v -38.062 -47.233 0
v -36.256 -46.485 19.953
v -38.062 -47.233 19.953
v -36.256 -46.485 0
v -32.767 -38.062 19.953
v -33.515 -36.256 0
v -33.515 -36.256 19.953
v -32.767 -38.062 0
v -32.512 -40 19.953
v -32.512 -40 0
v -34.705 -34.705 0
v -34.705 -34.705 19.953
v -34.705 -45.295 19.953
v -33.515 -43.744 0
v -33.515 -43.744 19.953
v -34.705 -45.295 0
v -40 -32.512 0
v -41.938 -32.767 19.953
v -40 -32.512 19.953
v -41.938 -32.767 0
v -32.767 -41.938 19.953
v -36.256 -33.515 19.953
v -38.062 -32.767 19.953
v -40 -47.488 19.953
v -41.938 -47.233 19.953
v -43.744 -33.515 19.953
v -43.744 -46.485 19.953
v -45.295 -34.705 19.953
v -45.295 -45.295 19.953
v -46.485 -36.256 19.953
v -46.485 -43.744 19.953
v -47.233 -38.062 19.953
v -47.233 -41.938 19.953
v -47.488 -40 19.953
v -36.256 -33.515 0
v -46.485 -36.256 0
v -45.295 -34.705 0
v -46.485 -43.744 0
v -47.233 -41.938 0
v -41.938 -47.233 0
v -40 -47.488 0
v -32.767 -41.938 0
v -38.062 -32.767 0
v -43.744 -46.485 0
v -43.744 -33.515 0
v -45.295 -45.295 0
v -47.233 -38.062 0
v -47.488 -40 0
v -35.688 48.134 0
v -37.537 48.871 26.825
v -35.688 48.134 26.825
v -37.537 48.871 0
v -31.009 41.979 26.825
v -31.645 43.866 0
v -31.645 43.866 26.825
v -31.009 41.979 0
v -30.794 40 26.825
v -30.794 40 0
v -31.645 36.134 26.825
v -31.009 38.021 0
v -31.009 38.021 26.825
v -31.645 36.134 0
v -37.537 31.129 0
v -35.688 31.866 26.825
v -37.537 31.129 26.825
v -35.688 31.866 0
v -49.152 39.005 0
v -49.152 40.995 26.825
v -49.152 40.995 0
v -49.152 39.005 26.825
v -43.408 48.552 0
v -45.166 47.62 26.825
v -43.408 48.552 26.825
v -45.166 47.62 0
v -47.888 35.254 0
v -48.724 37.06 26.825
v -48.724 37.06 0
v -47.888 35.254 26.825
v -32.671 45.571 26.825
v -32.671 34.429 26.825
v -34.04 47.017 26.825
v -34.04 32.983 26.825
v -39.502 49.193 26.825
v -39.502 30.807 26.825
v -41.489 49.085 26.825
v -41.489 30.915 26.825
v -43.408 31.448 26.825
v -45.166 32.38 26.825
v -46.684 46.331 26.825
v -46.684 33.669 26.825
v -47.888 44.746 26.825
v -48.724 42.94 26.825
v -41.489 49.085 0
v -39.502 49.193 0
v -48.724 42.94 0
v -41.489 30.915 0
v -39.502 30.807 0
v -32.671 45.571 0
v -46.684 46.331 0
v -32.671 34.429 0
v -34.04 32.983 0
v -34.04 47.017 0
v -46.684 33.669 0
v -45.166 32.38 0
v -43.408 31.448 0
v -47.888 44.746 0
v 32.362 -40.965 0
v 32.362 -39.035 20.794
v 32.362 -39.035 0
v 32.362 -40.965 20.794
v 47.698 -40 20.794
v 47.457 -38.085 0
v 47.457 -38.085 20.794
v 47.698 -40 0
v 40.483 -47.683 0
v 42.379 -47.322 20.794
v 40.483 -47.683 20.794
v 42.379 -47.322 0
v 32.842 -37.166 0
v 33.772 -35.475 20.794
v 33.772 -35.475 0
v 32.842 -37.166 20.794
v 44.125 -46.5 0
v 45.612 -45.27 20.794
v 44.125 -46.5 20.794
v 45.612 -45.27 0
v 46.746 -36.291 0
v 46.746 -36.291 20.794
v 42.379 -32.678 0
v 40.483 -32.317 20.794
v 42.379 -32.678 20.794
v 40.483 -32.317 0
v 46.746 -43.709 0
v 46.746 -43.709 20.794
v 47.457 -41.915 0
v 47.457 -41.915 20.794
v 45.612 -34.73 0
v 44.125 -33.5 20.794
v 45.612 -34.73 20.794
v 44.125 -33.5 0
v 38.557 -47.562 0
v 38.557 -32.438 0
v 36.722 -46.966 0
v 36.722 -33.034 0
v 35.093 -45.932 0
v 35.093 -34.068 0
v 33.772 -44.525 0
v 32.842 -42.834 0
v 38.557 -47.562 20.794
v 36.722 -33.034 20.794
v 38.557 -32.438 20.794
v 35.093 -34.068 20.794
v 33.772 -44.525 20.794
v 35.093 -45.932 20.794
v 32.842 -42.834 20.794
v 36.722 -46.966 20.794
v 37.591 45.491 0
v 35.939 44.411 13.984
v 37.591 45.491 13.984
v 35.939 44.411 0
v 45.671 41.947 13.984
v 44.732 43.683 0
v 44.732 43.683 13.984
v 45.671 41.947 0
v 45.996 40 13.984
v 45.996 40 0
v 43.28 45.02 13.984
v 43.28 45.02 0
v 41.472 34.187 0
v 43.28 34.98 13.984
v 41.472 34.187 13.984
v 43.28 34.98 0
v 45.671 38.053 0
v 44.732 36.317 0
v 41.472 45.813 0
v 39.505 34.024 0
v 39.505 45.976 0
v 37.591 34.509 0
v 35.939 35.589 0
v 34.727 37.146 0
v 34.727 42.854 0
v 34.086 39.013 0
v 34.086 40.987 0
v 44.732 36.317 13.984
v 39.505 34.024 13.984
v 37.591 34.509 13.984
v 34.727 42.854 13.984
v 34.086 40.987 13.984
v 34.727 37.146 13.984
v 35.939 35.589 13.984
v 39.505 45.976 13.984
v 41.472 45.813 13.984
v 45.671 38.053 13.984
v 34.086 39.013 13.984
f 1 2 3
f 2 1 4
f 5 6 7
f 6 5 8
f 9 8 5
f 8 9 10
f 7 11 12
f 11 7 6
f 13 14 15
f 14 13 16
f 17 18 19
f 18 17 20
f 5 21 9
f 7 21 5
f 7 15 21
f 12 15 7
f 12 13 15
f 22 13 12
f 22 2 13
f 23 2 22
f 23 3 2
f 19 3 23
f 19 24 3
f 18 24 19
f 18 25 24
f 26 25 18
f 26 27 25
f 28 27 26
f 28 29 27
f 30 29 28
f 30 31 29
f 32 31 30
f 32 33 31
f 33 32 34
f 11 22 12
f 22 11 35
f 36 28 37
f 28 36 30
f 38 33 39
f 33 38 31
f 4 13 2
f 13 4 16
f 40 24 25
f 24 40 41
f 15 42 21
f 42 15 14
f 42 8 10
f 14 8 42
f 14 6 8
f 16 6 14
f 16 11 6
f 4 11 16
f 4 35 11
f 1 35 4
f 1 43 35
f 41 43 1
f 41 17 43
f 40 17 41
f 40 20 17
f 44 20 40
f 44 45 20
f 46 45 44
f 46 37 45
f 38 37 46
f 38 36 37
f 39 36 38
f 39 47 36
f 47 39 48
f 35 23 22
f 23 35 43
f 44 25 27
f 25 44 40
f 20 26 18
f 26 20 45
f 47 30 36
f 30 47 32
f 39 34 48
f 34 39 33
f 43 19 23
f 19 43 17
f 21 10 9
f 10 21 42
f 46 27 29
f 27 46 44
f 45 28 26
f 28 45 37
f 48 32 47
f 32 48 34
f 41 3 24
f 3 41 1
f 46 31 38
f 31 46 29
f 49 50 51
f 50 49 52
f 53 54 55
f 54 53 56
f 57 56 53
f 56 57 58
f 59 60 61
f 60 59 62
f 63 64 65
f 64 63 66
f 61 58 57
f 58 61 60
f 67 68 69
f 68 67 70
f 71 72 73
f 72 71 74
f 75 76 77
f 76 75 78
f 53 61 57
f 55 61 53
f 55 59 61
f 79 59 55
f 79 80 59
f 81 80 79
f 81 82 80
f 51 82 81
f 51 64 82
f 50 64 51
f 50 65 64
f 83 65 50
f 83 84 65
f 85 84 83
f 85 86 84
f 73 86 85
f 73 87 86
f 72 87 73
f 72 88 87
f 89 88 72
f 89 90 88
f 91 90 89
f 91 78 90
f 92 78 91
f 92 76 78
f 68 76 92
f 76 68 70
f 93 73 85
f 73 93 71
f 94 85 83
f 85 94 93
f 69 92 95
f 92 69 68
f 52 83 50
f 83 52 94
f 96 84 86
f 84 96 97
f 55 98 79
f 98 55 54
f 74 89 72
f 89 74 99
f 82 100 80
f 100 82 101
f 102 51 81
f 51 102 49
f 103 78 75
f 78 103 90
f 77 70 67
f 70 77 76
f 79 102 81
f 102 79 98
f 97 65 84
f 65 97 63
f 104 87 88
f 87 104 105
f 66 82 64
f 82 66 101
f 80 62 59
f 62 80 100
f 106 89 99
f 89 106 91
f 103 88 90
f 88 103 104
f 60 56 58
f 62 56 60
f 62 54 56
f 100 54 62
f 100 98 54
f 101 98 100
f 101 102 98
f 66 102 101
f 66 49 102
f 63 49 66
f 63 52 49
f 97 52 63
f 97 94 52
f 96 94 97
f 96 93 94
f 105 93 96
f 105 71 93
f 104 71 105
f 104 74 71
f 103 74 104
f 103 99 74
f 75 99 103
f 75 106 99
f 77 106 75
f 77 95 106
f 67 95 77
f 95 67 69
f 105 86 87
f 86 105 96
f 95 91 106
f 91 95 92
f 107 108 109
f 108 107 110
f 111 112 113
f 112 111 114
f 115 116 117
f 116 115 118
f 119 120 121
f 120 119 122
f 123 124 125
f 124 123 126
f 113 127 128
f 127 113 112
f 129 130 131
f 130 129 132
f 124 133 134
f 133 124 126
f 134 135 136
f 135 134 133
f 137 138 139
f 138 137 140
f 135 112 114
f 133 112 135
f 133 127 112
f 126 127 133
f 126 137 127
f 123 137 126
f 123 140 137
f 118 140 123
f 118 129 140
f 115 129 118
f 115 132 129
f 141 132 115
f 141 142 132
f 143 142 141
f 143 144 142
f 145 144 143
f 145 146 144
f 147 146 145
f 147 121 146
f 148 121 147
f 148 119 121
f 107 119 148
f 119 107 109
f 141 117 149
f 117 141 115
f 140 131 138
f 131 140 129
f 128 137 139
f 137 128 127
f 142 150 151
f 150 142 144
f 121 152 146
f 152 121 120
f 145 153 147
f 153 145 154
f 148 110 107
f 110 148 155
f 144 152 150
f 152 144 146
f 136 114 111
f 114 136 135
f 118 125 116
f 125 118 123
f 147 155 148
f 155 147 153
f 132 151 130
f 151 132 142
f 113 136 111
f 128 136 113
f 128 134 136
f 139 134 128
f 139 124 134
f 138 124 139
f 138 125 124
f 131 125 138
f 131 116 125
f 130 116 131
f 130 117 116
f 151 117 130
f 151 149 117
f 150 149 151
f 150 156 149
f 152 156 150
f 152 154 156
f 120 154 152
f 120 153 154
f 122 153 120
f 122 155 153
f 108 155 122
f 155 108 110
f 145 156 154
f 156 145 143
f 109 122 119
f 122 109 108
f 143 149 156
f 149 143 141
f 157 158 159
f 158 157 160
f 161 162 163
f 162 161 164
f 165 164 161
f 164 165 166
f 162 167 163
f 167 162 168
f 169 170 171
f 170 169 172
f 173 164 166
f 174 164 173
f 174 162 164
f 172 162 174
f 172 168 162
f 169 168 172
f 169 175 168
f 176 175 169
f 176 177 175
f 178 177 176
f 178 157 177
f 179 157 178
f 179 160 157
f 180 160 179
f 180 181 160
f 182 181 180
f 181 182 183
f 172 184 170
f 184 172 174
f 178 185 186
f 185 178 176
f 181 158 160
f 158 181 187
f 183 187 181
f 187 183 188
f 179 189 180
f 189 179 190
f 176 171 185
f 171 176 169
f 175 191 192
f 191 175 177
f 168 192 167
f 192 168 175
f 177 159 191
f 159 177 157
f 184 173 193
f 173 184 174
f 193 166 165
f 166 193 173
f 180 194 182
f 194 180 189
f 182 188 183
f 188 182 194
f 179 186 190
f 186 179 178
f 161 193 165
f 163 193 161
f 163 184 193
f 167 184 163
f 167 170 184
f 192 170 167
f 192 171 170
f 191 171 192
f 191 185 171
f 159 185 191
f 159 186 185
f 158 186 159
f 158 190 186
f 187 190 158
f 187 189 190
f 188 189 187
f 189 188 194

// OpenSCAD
//
//  Random Gyroid Creator
//
//  https://animalcrossing.fandom.com/wiki/Gyroid_(furniture)
//


// seed for randomizer
seed_value = 1234; // [0:1000]

// rndIndex, min, max
ftDiameter   = [ 0, 10, 20 ];
// rndIndex, min, max
ftHeight     = [ 1, 10, 30 ];




module random_gyroid(seed_value) {

    rnd = rands(min_value=0, max_value=1, value_count=100, seed_value=seed_value);
    
    // indexes into the feature structure
    rndIndex = 0;  // which random number to use
    minIndex = 1;  // min value
    maxIndex = 2;  // max value

    function feature(ft) = ft[minIndex] + (rnd[rndIndex]*(ft[maxIndex]-ft[minIndex]));
        
    gy_diam = feature(ftDiameter);
    gy_height = feature(ftHeight);
    
    translate([0,0,gy_height/2]) cylinder(h=gy_height, d=gy_diam, center=true);
}

translate([-40,-40,0]) random_gyroid(seed_value);
translate([-40, 40,0]) random_gyroid(seed_value+1);
translate([ 40,-40,0]) random_gyroid(seed_value+2);
translate([ 40, 40,0]) random_gyroid(seed_value+3);
